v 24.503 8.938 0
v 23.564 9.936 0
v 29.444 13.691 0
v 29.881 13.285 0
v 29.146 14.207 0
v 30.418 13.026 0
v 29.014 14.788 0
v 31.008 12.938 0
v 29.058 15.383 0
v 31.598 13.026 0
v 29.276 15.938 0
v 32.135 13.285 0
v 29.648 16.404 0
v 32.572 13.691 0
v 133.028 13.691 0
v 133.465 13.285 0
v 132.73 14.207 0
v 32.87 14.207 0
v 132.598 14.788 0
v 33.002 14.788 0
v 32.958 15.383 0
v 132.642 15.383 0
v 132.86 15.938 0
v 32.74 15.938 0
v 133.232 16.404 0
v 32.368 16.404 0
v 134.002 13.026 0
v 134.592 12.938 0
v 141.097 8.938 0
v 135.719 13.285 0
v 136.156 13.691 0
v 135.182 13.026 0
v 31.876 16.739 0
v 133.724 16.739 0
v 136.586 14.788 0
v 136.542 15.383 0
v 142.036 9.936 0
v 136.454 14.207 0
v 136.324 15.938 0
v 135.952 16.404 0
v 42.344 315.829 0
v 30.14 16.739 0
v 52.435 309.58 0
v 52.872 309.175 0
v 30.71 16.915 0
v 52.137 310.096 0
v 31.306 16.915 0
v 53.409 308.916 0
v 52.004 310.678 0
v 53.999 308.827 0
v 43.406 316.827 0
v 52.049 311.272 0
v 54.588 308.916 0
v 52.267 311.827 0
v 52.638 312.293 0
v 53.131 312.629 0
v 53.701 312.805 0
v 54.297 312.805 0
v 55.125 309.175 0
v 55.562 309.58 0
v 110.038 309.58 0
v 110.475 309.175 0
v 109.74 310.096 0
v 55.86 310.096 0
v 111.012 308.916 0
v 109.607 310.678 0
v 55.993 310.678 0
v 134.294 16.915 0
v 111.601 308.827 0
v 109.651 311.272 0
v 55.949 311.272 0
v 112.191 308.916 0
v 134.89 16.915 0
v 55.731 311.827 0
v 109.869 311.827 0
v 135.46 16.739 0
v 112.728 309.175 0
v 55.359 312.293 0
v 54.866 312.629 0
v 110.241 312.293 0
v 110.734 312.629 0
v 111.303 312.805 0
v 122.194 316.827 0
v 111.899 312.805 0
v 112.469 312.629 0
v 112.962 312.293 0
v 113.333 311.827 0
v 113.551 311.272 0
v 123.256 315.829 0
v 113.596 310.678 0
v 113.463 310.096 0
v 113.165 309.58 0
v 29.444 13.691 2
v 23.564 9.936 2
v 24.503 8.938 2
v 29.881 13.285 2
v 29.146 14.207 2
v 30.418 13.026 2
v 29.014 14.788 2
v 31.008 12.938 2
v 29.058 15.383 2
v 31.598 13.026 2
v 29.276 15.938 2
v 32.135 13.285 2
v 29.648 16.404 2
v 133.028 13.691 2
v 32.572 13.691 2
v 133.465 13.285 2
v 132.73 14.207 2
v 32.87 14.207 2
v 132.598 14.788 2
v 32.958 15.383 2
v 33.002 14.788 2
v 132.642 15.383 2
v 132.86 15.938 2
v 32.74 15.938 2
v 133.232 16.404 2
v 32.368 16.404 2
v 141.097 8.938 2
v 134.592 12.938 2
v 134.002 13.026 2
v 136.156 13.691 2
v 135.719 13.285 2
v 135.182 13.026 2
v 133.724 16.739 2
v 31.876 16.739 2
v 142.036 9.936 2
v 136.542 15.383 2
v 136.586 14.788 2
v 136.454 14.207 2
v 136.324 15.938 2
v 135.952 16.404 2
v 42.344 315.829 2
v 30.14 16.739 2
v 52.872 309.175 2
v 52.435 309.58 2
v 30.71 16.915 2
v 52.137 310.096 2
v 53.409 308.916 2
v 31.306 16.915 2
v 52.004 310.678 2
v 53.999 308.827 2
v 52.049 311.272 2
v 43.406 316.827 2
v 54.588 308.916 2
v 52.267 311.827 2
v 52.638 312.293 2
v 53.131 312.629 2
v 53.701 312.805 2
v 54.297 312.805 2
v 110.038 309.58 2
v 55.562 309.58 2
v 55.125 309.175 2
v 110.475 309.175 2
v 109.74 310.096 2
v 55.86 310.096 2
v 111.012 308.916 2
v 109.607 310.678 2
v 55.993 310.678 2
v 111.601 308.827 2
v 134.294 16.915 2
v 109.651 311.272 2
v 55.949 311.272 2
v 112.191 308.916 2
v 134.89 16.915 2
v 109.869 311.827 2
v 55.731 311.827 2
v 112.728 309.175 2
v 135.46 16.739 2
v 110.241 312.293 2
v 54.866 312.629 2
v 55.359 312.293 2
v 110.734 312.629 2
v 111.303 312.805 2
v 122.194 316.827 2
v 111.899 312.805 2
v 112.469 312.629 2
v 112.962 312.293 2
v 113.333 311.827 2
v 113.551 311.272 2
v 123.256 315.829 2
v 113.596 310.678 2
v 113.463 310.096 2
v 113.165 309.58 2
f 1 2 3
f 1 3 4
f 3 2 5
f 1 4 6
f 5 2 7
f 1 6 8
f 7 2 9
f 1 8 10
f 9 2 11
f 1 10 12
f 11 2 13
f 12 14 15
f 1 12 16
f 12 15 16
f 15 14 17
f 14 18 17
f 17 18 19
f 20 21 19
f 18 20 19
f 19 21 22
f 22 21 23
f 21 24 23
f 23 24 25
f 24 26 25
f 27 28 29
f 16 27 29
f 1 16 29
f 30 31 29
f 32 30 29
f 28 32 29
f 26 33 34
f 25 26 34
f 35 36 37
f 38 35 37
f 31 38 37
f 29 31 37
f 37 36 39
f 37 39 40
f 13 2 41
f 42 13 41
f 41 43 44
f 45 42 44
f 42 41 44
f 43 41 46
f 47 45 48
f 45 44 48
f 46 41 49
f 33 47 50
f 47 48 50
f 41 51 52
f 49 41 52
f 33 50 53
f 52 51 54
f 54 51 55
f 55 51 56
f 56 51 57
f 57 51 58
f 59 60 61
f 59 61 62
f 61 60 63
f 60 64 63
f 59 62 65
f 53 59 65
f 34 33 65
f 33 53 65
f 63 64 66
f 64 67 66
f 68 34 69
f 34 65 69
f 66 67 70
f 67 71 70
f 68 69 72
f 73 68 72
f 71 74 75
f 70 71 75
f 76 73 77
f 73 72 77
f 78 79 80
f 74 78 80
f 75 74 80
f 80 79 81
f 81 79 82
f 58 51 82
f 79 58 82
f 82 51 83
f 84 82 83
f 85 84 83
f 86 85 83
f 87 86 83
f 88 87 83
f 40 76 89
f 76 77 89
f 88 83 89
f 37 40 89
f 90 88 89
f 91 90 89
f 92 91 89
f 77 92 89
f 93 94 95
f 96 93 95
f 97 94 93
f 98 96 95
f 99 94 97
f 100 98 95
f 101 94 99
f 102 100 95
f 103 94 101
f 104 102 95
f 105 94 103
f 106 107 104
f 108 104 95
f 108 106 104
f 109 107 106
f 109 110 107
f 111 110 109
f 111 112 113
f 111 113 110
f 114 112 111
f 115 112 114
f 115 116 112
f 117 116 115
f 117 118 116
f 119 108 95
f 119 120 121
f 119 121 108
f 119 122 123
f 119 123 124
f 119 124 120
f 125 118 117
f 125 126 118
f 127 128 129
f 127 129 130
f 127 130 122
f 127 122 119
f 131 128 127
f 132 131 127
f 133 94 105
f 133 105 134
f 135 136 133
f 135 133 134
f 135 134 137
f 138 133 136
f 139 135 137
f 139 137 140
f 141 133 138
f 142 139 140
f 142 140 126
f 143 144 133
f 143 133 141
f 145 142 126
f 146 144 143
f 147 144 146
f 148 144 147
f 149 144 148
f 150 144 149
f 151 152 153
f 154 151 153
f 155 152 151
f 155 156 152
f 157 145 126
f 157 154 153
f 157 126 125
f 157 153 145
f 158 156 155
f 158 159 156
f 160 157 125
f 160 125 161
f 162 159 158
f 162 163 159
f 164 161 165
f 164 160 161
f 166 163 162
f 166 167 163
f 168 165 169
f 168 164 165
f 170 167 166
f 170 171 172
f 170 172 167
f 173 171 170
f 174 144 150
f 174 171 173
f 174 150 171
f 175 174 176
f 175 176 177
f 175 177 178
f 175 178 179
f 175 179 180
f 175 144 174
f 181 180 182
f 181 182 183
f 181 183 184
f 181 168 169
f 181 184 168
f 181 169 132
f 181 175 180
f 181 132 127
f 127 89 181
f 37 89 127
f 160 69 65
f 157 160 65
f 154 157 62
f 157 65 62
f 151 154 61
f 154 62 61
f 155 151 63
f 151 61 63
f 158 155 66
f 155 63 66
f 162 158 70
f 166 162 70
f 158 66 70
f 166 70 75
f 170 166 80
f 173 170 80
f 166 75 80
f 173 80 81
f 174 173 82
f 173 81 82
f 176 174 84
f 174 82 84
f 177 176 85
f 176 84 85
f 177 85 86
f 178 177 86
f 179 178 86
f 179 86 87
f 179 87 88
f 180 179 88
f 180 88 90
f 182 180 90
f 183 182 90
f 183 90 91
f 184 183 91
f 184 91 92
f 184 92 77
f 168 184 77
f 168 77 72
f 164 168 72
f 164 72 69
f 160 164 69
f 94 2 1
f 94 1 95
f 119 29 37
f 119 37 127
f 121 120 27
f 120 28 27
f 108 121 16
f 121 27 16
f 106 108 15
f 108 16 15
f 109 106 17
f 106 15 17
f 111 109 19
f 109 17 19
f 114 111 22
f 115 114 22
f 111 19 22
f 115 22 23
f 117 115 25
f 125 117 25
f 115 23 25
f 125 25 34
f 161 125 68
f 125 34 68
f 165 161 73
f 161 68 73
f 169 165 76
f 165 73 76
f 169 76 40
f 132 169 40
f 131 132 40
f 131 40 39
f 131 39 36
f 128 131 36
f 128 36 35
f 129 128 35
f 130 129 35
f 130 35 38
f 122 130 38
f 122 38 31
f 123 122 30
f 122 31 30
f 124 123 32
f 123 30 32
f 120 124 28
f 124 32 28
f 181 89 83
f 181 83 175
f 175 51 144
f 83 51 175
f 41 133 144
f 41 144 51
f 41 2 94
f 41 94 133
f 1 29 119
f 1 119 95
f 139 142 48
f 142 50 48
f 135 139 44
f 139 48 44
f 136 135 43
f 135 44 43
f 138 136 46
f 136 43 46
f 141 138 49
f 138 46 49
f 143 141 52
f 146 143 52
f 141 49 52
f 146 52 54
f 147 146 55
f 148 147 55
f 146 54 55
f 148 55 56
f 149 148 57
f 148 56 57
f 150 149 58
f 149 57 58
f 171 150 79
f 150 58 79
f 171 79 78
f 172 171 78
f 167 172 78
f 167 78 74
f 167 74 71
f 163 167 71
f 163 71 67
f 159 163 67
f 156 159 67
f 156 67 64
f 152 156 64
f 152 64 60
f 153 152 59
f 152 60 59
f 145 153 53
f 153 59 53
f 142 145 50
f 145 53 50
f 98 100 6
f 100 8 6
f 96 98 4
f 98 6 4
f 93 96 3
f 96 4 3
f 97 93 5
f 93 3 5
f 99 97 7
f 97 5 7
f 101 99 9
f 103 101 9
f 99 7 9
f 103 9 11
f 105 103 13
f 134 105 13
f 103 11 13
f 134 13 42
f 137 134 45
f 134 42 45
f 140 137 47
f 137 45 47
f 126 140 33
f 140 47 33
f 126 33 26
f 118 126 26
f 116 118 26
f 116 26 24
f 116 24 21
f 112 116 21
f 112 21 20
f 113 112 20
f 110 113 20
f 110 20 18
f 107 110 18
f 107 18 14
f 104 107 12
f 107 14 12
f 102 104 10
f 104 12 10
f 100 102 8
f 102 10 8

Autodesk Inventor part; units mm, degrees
ref_plane "YZ Plane" through (0, 0, 0) normal (1, 0, 0) x (0, 1, 0)
ref_plane "XZ Plane" through (0, 0, 0) normal (0, 1, 0) x (-1, 0, 0)
ref_plane "XY Plane" through (0, 0, 0) normal (0, 0, 1) x (1, 0, 0)
ref_plane "Work Plane1" through (0, 0, 0) normal (0, 0, 1) x (1, 0, 0)
sketch "Sketch1" plane through (0, 0, 0) normal (0, 0, 1) x (1, 0, 0)
  line L0 (143.1602, 7.9375) -> (124.1349, 317.827) construction
  line L1 (145.6, 317.827) -> (20, 317.827) construction
  line L2 (41.4651, 317.827) -> (22.4398, 7.9375) construction
  line L3 (165.6, 7.9375) -> (0, 7.9375) construction
  line L4 (41.4651, 317.827) -> (124.1349, 317.827)
  line L5 (124.1349, 317.827) -> (143.1602, 7.9375)
  line L6 (143.1602, 7.9375) -> (22.4398, 7.9375)
  line L7 (22.4398, 7.9375) -> (41.4651, 317.827)
  line L8 (42.4056, 316.827) -> (123.1944, 316.827)
  line L9 (123.1944, 316.827) -> (142.097, 8.9375)
  line L10 (142.097, 8.9375) -> (23.503, 8.9375)
  line L11 (23.503, 8.9375) -> (42.4056, 316.827)
  point P0 (0, 0)
  dimension "d2" = 1
extrude "Extrusion1" add sketch "Sketch1" along normal blind 2 contours L8 L9 L10 L11
chamfer "Chamfer1" distance 1 angle 45 4 edges at (123.1944, 316.827, 1) (42.4056, 316.827, 1) (142.097, 8.9375, 1) (23.503, 8.9375, 1)
sketch "Sketch2" plane through (0, 0, 2) normal (0, 0, 1) x (1, 0, 0)
  line L0 (122.1944, 316.827) -> (43.4056, 316.827) construction
  line L1 (24.503, 8.9375) -> (141.097, 8.9375) construction
  line L2 (43.4056, 316.827) -> (122.1944, 316.827) construction
  line L3 (82.8, 316.827) -> (82.8, 8.9375) construction
  line L4 (141.097, 8.9375) -> (24.503, 8.9375) construction
  point P0 (0, 0)
  point P1 (53.9987, 310.827)
  point P2 (31.008, 14.9375)
  point P3 (111.6013, 310.827)
  point P4 (134.592, 14.9375)
  dimension "d6" = 6
  dimension "d7" = 6
hole "Hole1" at (53.9987, 310.827, 2) at (31.008, 14.9375, 2) at (111.6013, 310.827, 2) at (134.592, 14.9375, 2) direction (0, 0, -1) diameter 4 end through all
properties part number "LowerPlate"
